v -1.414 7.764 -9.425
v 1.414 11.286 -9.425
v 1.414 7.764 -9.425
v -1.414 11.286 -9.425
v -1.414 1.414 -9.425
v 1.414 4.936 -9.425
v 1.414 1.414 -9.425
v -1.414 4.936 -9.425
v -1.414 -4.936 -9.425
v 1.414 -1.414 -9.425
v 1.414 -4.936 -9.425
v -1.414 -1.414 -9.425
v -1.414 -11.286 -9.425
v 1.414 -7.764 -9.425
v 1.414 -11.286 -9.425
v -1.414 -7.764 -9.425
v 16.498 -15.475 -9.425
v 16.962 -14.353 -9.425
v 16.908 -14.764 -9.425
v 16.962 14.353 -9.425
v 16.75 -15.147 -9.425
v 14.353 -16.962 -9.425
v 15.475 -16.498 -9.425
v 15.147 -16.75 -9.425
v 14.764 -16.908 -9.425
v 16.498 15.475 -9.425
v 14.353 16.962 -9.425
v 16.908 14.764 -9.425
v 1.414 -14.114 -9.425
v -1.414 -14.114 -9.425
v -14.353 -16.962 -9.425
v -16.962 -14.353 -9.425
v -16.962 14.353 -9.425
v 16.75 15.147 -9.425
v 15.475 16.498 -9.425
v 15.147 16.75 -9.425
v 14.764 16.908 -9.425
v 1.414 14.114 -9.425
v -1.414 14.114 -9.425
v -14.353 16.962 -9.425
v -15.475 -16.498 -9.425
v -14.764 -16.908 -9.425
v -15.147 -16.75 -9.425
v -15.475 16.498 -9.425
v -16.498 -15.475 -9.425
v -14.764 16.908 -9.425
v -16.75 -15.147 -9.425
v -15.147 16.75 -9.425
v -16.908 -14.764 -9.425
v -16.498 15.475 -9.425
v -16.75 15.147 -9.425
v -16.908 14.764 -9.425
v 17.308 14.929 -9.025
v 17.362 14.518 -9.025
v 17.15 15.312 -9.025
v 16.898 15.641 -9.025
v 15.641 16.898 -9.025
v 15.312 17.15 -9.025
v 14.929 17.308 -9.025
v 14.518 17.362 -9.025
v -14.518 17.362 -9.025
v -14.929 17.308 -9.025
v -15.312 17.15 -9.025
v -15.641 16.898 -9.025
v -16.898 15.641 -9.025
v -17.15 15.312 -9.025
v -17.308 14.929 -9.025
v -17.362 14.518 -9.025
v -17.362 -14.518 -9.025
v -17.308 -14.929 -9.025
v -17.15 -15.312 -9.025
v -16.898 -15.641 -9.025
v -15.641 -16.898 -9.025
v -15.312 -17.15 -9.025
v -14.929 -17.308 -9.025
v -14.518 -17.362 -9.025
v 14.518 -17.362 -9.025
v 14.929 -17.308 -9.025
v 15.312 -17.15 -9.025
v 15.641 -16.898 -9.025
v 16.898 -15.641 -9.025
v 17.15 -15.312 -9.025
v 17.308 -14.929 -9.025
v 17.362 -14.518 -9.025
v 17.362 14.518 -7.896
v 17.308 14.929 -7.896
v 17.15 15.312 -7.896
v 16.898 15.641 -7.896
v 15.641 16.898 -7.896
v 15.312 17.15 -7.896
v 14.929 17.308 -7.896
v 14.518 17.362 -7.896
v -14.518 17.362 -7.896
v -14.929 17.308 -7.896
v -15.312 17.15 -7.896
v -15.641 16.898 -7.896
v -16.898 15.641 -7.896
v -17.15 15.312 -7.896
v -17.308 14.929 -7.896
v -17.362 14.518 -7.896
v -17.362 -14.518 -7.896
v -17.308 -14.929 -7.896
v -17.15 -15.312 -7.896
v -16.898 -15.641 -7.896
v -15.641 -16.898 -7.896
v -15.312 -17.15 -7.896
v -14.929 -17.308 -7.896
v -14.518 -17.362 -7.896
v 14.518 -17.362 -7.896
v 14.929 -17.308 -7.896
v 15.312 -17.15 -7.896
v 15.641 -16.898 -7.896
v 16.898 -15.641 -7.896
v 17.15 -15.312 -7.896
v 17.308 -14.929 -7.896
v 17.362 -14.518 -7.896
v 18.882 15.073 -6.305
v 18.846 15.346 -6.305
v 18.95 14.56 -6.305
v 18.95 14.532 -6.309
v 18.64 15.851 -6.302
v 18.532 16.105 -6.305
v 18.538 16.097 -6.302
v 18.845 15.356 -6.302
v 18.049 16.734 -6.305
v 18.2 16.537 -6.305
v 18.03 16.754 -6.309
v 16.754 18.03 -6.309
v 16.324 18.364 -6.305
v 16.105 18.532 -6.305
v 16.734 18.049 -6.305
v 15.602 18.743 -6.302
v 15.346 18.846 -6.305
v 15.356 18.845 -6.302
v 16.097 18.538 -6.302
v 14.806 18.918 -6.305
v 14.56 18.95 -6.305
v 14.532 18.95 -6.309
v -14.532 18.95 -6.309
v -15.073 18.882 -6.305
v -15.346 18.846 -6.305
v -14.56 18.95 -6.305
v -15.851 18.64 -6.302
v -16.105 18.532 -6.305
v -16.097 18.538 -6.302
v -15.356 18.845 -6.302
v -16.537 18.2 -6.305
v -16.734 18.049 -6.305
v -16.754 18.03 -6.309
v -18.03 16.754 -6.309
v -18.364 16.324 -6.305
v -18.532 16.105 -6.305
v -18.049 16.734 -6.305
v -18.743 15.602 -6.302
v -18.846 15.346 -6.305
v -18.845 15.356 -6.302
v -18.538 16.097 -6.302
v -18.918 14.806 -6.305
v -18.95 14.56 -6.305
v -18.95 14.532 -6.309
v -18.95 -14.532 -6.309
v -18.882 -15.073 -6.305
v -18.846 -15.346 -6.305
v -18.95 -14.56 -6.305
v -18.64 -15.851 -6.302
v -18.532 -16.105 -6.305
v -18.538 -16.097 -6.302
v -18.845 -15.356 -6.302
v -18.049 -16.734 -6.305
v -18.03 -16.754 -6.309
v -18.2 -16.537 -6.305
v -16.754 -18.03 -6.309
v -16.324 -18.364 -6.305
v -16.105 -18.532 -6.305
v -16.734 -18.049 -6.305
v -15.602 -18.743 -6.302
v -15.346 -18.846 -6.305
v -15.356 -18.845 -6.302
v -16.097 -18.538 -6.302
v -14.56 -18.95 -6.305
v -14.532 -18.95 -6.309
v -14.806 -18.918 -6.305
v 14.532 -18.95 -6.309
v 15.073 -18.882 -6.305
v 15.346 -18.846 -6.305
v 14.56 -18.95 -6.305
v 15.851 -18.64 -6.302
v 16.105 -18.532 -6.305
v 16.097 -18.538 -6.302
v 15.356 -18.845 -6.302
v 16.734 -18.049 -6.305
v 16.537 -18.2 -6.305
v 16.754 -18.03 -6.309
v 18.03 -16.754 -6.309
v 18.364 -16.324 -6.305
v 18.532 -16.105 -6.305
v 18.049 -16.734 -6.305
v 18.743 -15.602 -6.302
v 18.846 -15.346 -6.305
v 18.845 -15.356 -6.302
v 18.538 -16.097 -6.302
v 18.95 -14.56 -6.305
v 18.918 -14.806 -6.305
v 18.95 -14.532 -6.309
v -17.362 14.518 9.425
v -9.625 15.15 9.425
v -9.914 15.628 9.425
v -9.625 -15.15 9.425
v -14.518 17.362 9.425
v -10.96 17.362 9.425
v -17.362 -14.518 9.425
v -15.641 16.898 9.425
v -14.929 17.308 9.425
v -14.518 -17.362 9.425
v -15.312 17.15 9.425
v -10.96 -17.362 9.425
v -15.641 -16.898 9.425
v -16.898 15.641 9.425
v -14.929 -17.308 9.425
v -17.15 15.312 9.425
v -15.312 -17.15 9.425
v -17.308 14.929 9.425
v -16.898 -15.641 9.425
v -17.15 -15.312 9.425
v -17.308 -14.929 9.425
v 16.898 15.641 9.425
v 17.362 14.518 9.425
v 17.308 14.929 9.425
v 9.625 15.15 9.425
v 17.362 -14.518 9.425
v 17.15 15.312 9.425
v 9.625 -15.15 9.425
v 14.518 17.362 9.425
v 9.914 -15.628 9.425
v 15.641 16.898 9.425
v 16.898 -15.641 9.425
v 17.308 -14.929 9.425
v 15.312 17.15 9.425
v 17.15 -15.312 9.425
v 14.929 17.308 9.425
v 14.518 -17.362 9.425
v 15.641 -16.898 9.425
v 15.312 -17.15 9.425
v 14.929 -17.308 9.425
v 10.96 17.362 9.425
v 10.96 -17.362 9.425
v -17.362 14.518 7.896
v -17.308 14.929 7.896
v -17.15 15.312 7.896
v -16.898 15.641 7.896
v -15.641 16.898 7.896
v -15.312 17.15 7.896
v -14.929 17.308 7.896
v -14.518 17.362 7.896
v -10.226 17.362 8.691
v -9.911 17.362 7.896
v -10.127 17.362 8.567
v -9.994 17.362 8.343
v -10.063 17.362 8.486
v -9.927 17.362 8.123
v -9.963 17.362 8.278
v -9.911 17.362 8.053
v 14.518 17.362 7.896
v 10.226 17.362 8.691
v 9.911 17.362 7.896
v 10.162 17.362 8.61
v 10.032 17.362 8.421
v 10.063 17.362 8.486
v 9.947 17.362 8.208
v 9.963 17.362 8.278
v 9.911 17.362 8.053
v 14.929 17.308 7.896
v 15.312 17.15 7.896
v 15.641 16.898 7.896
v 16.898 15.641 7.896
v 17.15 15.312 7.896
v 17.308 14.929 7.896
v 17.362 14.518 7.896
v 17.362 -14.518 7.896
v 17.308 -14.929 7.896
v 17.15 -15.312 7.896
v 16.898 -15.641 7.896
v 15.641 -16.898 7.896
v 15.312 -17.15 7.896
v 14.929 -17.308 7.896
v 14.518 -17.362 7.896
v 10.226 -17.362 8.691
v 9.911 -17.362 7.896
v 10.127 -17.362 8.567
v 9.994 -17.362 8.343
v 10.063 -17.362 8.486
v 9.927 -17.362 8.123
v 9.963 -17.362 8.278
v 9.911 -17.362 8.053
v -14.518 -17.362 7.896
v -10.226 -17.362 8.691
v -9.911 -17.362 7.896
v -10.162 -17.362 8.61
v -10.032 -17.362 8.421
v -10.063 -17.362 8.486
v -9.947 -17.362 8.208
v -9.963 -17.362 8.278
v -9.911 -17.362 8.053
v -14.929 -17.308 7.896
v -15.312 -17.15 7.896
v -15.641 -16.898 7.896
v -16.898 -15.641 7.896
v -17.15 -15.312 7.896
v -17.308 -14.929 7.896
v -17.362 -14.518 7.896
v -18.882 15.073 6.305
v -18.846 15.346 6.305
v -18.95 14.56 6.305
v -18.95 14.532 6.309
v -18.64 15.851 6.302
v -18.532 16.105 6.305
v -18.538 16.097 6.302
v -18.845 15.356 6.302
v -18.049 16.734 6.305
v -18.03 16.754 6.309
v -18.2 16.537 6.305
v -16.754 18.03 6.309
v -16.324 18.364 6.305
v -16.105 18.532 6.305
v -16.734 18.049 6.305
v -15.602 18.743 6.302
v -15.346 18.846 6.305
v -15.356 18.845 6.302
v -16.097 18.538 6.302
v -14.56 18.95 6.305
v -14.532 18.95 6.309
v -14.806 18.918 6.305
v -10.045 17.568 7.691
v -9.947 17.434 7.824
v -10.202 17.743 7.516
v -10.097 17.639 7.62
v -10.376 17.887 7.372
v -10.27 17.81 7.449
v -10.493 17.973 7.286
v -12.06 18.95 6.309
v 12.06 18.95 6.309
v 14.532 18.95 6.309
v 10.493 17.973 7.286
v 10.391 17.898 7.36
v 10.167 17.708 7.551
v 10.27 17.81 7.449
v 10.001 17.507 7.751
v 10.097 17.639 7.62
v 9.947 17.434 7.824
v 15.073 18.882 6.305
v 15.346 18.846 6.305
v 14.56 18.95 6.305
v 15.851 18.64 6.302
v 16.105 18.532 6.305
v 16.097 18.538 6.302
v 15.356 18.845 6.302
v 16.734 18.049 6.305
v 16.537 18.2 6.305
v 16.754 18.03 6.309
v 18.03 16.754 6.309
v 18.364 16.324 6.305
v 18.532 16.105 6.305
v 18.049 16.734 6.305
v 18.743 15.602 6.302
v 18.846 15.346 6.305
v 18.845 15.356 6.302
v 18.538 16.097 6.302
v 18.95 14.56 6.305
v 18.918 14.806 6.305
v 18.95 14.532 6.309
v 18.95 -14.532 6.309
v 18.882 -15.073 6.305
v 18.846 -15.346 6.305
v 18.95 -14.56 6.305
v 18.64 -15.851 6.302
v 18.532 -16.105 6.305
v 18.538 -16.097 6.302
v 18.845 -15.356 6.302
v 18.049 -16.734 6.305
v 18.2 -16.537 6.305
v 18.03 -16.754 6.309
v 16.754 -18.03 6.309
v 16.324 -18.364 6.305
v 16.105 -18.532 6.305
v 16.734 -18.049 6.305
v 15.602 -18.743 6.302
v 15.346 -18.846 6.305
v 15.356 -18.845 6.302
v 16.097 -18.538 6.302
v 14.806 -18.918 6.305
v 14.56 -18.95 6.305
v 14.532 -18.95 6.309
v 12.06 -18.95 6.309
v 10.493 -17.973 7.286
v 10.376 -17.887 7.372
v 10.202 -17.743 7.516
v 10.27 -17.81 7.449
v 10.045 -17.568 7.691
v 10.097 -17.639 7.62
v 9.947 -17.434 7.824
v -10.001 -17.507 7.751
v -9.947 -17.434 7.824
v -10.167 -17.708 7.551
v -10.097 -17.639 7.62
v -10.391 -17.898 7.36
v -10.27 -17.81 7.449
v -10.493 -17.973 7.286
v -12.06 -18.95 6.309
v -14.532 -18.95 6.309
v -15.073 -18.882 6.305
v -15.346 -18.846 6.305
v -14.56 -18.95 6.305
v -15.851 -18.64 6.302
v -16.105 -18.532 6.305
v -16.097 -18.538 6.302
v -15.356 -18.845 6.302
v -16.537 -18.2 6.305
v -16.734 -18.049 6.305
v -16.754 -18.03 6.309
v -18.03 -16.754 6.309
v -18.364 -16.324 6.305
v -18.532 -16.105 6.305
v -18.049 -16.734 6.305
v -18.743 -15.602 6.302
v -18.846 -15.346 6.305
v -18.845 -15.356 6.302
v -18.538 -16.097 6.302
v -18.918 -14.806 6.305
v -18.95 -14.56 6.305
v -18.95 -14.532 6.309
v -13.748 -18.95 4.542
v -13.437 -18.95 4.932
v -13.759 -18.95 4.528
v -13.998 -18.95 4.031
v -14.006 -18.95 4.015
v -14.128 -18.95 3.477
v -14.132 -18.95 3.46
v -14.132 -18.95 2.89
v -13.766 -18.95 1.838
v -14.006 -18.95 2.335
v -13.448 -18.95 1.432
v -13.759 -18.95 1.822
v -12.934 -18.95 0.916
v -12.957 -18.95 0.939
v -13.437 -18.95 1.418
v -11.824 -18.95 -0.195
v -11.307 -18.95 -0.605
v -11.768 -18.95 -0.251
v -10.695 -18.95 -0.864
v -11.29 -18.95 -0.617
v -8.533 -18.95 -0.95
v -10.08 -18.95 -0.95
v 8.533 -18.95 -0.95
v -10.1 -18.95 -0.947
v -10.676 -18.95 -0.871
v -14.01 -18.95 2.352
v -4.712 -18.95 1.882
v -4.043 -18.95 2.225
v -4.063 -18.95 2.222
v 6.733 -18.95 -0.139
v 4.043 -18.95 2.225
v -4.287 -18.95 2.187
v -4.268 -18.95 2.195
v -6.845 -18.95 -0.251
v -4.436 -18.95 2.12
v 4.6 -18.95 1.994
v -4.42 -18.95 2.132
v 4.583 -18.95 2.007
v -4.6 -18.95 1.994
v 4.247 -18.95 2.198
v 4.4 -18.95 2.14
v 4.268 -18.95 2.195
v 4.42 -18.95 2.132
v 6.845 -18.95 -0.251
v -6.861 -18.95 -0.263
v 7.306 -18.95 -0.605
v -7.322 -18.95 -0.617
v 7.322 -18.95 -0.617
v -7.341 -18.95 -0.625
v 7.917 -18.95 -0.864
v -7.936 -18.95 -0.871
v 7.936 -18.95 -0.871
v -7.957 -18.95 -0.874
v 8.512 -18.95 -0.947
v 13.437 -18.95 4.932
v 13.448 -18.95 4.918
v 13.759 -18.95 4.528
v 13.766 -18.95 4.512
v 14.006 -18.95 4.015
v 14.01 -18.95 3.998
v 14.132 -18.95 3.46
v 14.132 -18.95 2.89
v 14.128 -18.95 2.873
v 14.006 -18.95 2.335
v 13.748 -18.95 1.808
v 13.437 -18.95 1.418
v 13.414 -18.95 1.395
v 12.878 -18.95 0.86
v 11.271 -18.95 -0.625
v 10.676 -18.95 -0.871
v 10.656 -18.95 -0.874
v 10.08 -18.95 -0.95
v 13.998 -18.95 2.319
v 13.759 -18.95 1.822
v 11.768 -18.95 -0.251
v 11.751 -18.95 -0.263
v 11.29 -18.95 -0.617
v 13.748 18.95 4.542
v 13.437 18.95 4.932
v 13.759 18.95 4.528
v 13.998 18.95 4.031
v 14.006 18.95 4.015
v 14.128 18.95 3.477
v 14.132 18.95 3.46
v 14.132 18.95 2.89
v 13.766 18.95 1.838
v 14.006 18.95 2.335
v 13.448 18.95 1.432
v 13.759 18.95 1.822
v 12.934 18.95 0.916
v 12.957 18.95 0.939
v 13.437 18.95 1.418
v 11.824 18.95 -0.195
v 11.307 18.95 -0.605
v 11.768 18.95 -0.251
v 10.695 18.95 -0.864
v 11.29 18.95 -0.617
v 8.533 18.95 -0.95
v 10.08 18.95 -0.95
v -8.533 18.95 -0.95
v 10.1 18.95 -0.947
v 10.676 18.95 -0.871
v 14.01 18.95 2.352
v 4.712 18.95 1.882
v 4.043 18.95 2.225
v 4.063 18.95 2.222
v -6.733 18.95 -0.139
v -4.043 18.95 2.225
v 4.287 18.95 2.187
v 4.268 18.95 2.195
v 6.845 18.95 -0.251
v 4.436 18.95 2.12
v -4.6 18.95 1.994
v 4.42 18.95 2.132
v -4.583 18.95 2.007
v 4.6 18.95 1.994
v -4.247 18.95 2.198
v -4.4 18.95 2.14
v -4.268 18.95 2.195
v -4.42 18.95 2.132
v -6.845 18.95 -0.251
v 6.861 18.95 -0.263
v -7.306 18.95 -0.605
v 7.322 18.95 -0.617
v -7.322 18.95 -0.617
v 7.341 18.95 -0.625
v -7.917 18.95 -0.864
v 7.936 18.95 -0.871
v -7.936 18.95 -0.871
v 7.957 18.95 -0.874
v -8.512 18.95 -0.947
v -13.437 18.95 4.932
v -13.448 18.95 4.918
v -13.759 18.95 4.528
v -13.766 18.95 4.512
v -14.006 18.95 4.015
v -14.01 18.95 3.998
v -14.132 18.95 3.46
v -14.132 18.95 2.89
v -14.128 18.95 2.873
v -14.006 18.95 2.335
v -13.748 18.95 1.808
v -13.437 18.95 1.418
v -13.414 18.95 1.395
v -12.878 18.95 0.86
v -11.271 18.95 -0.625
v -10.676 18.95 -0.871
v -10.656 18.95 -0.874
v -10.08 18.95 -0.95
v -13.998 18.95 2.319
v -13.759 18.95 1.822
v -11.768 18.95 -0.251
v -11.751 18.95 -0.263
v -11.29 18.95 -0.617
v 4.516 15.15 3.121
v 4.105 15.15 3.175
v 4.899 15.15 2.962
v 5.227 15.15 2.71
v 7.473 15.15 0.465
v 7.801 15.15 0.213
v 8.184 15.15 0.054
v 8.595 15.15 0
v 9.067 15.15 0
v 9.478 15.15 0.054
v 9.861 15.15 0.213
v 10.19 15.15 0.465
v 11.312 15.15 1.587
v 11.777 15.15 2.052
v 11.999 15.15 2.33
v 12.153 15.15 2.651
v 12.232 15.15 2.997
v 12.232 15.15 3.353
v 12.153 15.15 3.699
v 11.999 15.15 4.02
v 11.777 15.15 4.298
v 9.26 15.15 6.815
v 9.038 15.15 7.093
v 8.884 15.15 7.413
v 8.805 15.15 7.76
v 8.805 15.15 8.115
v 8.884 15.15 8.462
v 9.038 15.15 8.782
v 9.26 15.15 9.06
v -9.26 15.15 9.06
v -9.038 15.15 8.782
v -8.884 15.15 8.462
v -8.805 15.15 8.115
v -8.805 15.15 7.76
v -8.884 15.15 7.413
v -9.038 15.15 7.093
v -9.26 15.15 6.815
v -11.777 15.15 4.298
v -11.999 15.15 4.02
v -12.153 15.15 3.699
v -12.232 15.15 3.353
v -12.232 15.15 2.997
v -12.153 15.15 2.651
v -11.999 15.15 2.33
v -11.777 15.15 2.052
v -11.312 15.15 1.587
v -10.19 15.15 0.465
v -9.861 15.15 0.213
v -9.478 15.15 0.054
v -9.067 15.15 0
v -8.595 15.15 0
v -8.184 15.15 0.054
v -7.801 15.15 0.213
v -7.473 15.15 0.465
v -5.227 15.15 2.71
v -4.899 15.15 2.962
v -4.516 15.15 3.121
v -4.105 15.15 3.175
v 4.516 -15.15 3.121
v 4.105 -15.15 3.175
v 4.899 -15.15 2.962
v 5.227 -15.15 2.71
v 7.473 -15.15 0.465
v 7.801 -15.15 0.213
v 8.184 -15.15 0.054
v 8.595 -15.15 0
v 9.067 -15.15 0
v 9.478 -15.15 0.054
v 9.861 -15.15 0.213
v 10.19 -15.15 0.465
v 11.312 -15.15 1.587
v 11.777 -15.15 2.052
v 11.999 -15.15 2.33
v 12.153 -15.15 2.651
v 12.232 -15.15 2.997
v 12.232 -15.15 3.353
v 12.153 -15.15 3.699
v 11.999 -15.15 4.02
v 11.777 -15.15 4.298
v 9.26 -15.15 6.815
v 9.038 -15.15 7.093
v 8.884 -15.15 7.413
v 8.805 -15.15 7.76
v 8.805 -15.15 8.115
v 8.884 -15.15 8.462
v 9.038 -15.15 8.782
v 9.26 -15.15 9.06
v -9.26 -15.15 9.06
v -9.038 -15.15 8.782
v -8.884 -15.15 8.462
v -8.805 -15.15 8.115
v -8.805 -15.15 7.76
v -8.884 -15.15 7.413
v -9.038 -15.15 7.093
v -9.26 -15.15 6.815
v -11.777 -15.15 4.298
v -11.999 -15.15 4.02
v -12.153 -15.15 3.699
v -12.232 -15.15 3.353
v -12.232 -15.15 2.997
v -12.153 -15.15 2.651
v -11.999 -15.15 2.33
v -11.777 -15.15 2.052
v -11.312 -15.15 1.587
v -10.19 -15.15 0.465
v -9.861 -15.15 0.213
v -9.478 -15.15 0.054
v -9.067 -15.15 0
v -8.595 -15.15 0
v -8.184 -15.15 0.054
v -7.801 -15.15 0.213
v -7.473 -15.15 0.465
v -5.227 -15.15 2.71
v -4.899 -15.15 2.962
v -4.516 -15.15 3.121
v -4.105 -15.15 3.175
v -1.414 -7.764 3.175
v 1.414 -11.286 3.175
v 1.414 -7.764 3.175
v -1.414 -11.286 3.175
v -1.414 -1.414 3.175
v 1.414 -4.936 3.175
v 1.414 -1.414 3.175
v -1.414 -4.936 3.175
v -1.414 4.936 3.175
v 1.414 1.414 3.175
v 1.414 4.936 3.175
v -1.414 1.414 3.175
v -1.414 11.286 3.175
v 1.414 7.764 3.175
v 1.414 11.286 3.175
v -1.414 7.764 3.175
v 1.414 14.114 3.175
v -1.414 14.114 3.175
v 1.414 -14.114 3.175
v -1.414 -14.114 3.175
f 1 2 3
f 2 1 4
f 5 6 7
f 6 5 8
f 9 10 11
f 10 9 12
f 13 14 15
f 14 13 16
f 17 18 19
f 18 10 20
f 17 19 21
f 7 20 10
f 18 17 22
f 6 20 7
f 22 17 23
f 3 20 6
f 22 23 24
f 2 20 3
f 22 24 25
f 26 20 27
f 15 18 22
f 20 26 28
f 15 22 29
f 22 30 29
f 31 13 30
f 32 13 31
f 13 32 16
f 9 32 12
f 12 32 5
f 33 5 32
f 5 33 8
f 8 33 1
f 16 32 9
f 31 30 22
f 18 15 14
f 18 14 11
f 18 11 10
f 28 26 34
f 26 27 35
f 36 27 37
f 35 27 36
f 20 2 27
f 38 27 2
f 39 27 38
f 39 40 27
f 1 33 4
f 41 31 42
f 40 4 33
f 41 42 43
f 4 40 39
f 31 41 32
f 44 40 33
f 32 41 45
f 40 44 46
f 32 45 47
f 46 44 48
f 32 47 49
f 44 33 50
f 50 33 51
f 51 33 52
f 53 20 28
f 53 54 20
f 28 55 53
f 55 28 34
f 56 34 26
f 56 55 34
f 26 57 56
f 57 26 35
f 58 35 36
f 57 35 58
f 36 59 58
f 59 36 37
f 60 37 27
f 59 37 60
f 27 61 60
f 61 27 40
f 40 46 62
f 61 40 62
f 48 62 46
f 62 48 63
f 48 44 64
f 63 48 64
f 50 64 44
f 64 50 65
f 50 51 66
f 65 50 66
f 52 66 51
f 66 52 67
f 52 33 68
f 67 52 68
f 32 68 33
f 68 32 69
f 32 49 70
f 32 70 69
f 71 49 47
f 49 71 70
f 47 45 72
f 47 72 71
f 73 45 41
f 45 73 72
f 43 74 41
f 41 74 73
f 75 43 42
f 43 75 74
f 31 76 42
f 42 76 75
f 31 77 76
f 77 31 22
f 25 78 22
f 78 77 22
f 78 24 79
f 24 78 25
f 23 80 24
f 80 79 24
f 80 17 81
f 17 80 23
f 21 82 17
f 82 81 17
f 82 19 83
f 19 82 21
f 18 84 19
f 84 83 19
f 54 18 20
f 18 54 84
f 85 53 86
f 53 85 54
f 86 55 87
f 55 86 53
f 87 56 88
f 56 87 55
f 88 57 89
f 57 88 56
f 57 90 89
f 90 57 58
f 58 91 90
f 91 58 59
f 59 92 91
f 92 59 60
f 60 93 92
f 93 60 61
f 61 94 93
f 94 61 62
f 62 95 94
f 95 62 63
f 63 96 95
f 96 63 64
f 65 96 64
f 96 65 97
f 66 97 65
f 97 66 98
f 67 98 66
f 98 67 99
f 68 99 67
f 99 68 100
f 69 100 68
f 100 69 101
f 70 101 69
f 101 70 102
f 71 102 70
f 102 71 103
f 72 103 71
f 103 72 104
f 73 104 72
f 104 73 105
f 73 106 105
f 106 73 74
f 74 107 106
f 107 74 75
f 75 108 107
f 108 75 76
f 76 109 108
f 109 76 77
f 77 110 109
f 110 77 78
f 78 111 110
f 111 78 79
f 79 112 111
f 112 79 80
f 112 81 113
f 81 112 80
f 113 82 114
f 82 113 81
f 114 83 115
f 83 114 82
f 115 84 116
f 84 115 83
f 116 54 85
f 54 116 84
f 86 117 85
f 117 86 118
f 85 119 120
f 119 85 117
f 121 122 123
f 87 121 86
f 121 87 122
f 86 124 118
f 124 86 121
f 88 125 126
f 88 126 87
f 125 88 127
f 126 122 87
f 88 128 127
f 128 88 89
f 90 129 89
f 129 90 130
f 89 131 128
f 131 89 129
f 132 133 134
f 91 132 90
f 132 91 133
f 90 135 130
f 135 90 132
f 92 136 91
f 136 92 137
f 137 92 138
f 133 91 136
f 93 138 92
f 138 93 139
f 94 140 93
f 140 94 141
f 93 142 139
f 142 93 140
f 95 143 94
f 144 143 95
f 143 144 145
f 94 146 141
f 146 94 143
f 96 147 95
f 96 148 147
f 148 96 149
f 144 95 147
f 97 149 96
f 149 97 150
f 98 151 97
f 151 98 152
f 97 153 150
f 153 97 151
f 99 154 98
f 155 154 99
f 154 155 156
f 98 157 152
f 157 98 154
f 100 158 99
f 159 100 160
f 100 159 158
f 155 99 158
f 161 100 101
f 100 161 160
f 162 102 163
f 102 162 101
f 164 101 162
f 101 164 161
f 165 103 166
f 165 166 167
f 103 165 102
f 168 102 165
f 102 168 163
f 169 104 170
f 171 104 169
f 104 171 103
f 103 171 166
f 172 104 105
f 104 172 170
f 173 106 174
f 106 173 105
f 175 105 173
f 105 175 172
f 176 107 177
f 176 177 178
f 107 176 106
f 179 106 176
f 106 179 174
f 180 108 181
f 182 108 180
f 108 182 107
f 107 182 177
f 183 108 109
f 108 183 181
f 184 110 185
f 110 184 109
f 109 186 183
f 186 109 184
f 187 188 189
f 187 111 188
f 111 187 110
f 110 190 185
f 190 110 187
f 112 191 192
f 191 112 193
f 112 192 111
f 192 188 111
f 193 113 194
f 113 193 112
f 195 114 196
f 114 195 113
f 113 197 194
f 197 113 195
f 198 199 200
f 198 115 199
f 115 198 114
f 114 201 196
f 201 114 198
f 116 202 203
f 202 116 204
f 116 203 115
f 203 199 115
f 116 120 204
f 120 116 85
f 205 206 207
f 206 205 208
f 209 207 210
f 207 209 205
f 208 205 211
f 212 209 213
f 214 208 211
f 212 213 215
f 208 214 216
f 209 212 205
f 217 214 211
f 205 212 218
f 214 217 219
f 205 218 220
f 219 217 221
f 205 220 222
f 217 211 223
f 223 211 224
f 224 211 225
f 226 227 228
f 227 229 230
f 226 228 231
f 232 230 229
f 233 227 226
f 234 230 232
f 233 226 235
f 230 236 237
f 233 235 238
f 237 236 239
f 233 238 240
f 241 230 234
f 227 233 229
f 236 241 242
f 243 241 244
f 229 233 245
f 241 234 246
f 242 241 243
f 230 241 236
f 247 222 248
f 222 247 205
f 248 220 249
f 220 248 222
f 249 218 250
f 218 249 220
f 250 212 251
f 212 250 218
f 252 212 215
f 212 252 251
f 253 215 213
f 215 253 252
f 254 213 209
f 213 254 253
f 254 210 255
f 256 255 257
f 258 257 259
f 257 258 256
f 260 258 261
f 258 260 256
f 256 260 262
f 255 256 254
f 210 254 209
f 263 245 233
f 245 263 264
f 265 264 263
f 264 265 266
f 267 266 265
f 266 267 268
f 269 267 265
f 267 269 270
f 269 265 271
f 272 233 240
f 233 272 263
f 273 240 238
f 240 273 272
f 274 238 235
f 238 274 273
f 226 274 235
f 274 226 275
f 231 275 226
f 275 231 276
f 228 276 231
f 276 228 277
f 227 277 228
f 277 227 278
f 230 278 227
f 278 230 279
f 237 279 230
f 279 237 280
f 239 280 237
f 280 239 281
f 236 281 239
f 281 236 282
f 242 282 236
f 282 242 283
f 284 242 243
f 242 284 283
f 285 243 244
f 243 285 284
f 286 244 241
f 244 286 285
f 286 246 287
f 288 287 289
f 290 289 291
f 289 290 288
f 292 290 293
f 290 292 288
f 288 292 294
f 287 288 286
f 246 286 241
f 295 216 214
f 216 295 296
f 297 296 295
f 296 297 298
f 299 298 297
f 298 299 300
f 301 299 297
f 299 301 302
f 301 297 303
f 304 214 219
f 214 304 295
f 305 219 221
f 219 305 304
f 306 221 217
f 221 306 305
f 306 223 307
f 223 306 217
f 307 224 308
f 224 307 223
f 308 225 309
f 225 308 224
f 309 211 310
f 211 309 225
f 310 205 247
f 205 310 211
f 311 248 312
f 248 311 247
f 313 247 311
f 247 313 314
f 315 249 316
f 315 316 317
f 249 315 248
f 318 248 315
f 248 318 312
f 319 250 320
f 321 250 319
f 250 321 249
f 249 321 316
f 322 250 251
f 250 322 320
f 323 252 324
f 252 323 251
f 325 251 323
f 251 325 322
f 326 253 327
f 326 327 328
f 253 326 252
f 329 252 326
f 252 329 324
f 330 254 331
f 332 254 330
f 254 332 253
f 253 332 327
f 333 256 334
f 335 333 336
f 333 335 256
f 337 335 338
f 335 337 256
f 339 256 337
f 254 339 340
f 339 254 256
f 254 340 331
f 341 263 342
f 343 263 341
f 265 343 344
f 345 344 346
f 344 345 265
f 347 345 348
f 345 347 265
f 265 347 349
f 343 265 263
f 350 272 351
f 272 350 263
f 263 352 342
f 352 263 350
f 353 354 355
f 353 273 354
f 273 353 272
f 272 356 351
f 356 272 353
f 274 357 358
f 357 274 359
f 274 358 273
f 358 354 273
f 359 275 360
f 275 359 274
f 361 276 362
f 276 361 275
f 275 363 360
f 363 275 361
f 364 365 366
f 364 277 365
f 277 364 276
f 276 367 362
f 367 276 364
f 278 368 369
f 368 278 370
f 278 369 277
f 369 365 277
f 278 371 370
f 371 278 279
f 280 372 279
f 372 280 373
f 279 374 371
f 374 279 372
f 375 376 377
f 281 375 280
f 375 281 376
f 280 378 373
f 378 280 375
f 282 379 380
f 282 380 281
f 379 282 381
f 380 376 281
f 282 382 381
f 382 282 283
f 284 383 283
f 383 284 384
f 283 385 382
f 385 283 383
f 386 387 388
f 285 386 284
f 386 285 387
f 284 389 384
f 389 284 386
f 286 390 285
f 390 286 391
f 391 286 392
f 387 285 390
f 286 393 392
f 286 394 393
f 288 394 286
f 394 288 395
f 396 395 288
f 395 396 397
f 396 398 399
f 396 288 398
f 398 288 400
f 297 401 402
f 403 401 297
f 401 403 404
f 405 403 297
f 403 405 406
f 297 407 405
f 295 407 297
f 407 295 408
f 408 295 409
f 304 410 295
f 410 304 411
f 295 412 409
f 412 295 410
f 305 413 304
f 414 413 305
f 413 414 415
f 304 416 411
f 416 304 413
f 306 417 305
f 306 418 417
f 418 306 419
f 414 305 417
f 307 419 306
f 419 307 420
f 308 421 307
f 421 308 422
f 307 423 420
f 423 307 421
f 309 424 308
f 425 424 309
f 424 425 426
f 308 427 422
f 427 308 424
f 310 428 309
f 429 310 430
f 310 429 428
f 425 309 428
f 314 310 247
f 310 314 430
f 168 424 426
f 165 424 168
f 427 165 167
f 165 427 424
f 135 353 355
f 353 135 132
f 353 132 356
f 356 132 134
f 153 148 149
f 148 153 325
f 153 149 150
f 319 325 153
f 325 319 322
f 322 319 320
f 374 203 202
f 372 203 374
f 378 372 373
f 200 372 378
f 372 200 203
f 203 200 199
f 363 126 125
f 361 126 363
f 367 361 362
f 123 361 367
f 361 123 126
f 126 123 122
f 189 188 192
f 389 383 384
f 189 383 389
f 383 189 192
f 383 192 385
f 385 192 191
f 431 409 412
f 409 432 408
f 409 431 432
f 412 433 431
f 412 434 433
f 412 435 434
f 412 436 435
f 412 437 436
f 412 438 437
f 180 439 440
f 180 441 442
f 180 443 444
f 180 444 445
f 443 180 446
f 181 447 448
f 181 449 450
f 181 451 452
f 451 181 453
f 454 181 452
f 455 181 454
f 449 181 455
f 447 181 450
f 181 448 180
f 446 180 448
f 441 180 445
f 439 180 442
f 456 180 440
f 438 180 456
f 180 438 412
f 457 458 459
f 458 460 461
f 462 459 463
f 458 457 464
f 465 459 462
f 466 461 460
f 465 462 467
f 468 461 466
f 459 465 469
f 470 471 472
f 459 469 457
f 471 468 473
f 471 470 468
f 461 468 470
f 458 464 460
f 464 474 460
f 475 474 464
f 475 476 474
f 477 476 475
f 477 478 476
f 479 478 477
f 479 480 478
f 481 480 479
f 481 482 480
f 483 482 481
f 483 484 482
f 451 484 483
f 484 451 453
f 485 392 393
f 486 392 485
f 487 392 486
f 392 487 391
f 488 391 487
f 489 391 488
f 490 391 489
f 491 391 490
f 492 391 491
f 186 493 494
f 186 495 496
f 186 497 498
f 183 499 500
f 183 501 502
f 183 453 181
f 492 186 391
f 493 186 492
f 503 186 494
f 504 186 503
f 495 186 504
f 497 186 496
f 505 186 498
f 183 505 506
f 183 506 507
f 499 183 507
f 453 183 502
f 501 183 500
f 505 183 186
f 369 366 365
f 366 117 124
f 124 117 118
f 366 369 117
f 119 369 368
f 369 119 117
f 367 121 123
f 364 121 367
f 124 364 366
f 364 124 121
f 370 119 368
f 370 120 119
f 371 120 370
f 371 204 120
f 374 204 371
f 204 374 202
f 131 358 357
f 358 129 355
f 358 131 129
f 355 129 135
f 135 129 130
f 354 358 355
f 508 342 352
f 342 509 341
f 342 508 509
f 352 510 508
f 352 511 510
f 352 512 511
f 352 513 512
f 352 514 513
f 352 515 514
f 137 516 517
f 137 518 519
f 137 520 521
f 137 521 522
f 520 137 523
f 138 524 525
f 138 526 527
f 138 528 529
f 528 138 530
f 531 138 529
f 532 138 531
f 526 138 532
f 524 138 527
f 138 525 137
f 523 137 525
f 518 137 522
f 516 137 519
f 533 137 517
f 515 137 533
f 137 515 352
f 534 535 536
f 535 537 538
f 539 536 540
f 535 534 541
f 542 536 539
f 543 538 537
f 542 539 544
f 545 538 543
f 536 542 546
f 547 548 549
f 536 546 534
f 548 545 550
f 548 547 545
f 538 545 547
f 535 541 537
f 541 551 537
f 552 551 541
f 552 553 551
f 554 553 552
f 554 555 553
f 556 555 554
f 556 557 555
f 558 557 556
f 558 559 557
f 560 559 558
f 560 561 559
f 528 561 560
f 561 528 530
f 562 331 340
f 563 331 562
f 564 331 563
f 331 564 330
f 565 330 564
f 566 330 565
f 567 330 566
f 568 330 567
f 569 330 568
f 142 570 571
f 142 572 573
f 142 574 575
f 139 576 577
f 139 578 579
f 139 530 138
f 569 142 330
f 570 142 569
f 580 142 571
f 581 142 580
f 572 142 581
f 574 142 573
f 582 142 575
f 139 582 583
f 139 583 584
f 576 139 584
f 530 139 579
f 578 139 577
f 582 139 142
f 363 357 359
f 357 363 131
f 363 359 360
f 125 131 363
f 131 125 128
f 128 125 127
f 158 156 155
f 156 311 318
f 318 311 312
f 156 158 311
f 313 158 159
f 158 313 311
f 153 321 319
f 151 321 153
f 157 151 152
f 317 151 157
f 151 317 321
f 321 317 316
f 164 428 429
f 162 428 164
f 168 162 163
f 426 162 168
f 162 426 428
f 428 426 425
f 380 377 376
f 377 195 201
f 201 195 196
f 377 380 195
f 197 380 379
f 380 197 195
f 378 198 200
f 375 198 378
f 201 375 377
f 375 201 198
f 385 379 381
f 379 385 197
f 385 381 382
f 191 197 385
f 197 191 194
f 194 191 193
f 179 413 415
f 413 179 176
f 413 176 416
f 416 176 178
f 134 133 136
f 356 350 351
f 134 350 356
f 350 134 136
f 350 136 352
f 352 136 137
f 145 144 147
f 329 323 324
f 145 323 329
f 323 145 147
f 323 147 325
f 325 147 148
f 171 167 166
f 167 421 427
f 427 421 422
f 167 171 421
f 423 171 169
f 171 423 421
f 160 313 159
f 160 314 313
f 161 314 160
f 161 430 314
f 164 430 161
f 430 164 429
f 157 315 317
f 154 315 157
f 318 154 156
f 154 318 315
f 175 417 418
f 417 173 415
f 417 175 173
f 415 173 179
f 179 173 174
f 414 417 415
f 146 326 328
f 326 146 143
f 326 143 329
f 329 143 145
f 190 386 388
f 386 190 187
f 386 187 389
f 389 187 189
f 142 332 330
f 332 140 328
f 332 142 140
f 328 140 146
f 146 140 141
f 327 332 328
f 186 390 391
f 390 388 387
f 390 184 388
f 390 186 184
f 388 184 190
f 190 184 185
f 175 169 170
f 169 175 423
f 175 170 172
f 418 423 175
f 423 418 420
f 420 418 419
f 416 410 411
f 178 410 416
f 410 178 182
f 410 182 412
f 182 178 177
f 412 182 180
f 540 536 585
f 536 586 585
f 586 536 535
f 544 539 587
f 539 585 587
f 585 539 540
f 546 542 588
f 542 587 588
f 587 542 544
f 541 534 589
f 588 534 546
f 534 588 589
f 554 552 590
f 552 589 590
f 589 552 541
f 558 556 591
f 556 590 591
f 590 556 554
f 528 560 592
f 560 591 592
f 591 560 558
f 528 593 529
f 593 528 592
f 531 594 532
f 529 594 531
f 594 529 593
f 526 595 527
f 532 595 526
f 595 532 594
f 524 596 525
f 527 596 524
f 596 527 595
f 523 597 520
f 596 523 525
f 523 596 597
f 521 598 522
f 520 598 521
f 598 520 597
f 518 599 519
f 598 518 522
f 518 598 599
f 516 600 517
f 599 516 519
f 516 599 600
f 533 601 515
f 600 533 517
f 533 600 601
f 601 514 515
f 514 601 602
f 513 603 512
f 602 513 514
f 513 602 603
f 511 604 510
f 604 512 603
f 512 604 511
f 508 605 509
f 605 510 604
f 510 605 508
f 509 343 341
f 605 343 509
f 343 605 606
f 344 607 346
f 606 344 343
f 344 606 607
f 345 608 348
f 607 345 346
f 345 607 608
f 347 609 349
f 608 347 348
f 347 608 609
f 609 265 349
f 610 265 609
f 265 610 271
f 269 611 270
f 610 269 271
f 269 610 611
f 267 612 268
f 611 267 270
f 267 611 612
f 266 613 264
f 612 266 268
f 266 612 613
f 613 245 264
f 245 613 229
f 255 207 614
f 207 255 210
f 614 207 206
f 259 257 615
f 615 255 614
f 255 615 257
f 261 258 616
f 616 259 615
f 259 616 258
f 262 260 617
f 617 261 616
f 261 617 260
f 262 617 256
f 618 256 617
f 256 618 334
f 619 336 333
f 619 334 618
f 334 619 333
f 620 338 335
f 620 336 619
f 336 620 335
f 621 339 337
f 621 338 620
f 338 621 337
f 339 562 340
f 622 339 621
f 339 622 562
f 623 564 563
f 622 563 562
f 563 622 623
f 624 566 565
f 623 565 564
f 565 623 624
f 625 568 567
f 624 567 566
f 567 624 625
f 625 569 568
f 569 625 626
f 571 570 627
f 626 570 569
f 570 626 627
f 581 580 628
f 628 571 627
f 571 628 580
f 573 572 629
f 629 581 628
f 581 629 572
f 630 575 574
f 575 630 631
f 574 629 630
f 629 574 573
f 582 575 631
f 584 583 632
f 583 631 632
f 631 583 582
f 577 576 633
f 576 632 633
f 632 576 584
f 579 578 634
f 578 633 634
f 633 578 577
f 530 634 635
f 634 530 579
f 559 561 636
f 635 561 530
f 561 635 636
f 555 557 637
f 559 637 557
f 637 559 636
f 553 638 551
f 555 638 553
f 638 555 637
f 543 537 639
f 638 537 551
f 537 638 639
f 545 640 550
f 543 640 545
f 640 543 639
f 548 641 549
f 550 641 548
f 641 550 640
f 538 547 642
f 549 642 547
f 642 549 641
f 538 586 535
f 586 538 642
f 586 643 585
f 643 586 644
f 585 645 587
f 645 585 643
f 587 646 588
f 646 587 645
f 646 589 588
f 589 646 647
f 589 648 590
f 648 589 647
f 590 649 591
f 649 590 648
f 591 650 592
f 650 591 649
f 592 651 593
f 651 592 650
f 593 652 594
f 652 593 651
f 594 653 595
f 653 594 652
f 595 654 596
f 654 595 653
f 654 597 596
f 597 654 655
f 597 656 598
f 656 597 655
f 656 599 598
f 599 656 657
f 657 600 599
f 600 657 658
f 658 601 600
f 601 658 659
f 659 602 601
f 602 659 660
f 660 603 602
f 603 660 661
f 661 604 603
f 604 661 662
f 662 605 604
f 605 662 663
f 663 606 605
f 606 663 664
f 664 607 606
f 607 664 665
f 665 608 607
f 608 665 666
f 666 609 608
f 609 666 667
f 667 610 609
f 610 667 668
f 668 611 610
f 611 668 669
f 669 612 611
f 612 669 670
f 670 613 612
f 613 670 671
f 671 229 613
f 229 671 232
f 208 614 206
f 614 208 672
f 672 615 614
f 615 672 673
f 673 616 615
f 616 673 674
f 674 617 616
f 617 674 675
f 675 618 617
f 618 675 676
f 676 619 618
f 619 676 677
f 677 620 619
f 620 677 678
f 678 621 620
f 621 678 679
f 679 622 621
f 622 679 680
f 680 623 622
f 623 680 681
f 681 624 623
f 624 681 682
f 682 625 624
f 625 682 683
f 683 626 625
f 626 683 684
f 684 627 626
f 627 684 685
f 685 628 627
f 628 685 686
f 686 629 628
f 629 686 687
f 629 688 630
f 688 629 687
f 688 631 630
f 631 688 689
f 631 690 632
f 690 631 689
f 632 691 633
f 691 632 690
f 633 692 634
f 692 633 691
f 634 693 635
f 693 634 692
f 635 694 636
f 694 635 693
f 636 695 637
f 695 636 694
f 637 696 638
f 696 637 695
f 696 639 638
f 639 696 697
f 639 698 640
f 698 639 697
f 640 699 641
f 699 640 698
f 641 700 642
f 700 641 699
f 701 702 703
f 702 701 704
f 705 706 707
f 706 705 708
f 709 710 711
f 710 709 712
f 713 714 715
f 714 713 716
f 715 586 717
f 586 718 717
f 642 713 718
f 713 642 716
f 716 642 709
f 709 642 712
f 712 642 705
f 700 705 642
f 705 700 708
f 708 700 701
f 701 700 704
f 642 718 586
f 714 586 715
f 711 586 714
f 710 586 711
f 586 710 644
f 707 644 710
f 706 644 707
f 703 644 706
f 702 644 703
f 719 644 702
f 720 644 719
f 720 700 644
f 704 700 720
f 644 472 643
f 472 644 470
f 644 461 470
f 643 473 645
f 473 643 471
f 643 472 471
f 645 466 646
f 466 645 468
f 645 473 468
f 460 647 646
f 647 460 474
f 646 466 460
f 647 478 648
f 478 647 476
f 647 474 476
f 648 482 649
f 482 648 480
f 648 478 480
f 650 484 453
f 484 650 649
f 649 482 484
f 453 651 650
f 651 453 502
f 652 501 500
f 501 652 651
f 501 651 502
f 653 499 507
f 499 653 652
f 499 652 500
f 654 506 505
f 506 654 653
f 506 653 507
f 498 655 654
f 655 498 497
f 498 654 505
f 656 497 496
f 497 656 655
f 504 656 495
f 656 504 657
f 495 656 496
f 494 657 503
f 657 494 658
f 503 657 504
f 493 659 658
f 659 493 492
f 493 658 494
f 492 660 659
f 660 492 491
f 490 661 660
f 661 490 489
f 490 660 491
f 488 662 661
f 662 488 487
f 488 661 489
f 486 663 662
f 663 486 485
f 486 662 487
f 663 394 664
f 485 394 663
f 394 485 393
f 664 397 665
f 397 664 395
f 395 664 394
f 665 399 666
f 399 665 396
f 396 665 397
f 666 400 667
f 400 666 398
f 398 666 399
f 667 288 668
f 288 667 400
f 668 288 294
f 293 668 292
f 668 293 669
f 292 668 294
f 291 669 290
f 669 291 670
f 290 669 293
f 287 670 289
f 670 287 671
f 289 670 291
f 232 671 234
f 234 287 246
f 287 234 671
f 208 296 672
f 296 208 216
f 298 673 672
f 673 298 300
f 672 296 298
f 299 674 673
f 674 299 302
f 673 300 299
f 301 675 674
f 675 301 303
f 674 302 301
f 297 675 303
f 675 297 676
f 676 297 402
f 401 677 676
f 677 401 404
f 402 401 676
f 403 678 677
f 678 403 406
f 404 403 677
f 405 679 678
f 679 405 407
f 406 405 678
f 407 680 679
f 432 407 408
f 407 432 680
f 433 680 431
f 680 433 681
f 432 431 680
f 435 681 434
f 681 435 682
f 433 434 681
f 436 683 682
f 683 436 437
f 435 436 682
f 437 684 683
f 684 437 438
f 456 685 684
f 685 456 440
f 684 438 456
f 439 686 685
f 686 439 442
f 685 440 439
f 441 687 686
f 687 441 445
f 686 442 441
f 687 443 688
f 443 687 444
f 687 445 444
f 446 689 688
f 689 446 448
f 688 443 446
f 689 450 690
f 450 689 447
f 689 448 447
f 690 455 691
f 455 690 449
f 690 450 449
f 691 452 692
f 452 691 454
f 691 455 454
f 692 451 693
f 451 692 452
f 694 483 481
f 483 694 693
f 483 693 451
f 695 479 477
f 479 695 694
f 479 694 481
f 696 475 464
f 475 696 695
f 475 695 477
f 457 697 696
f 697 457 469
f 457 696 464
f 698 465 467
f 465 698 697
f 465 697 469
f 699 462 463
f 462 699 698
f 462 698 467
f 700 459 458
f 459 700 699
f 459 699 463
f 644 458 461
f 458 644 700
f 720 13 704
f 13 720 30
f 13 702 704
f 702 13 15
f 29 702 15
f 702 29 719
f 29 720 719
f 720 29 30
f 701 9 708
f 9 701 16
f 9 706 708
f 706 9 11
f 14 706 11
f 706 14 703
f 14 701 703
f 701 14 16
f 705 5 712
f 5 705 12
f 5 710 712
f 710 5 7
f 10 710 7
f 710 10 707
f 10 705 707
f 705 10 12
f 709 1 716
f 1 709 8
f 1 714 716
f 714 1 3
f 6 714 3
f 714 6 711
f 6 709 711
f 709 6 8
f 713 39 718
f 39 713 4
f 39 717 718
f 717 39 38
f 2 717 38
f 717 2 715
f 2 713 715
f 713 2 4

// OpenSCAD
// MiiRailPSMount0.1
// 
// 'Generic' mount for power strips that mount on screw heads.
// Put two of these along a MiniRail and then jam the power strip on, I guess.

$fn = 32;
block_size = ["1+1/2inch", "1+1/2inch", "3/4inch"];
mr_offset = 0.2;
$tgx11_offset = -0.1;

use <../lib/TOGMod1.scad>
use <../lib/TOGMod1Constructors.scad>
use <../lib/TOGPath1.scad>
use <../lib/TOGPolyhedronLib1.scad>
use <../lib/TOGVecLib0.scad>
use <../lib/TOGUnits1.scad>
use <../lib/TGx11.1Lib.scad>

block_size_mm = togunits1_vec_to_mms(block_size);
$togridlib3_unit_table = tgx11_get_default_unit_table();

function mirror_rathnodes(nodes) =
	[for(i=[len(nodes)-1 : -1 : 0])
		let(n=nodes[i])
		[n[0], [-n[1][0], n[1][1]], for(o=[2:1:len(n)-1]) n[o]]
	];

function make_mr_basic_rath(mr_offset, offset) =
	let( inch = 25.4 )
	let( u = inch/16 )
	let( rd1 = [
	   ["togpath1-rathnode", [          + 3*u, -4*u], ["round", u], ["offset", offset]],
		["togpath1-rathnode", [          + 5*u, -6*u], ["round", u], ["offset", offset]],
		["togpath1-rathnode", [mr_offset + 6*u, -6*u], ["round", u], ["offset", offset]],
		["togpath1-rathnode", [mr_offset + 7*u, -5*u], ["round", u], ["offset", offset]],
		["togpath1-rathnode", [mr_offset + 8*u, -4*u], ["round", u], ["offset", offset]],
		["togpath1-rathnode", [mr_offset + 5*u, -1*u], ["round", u], ["offset", offset]],
		["togpath1-rathnode", [mr_offset + 7*u,  1*u],               ["offset", offset]],
	])
	["togpath1-rath", each rd1, each mirror_rathnodes(rd1)];

hole = tphl1_make_z_cylinder(zrange=[-100,100], d=4, $fn=4);
rothole = ["rotate", [0,0,45], hole];
// hole = ["rotate", [0,0,45], tphl1_make_z_cylinder(zds=[[-1,8], [1,8], [3,4], [100,4]], $fn=4)];
// hole = ["rotate", [0,0,45], tphl1_make_z_cylinder(zds=[[0.3, 4], [100,4]], $fn=4)];

togmod1_domodule(
	let( inch = 25.4 )
	let( u = inch/16 )
	["difference",
		["translate", [0,0,-block_size_mm[2]/2], tgx11_block(togunits1_vec_to_cas(block_size), lip_height=-1, bottom_segmentation="chunk", top_segmentation="chunk", bottom_foot_bevel=0.4)],
		//togmod1_make_cuboid(block_size_mm),
		
		/*["translate", [0,0,1.5*inch/2], togmod1_linear_extrude_x([-2*inch, 2*inch],
			togmod1_make_polygon(togpath1_rath_to_polypoints(mr_basic_rath))
		)],*/
		["translate", [0,0,block_size_mm[2]/2], ["rotate", [90,0,0], tphl1_make_polyhedron_from_layer_function([
		   [-block_size_mm[0]/2 - 0.1, 1, 1],
			[-block_size_mm[0]/2 + 3.9, 0, 0],
			[ block_size_mm[0]/2 - 3.9, 0, 0],
		   [ block_size_mm[0]/2 + 0.1, 1, 1],
		], function(zo) togvec0_offset_points(
			togpath1_rath_to_polypoints(make_mr_basic_rath(mr_offset=mr_offset+zo[1], offset=zo[2])),
			zo[0]
	   ))]],

		//for(xm=[-2 : 1 : 2])	for(ym=[-2 : 1 : 2])
		for(xm=[0 : 1 : 0]) for(ym=[-2 : 1 : 2])
		//let(xm=0, ym=0)
		//if( (xm+ym+100) % 2 == 0 )
		["translate", [xm*6.35,ym*6.35,-block_size_mm[2]/2], rothole],
	]
);
